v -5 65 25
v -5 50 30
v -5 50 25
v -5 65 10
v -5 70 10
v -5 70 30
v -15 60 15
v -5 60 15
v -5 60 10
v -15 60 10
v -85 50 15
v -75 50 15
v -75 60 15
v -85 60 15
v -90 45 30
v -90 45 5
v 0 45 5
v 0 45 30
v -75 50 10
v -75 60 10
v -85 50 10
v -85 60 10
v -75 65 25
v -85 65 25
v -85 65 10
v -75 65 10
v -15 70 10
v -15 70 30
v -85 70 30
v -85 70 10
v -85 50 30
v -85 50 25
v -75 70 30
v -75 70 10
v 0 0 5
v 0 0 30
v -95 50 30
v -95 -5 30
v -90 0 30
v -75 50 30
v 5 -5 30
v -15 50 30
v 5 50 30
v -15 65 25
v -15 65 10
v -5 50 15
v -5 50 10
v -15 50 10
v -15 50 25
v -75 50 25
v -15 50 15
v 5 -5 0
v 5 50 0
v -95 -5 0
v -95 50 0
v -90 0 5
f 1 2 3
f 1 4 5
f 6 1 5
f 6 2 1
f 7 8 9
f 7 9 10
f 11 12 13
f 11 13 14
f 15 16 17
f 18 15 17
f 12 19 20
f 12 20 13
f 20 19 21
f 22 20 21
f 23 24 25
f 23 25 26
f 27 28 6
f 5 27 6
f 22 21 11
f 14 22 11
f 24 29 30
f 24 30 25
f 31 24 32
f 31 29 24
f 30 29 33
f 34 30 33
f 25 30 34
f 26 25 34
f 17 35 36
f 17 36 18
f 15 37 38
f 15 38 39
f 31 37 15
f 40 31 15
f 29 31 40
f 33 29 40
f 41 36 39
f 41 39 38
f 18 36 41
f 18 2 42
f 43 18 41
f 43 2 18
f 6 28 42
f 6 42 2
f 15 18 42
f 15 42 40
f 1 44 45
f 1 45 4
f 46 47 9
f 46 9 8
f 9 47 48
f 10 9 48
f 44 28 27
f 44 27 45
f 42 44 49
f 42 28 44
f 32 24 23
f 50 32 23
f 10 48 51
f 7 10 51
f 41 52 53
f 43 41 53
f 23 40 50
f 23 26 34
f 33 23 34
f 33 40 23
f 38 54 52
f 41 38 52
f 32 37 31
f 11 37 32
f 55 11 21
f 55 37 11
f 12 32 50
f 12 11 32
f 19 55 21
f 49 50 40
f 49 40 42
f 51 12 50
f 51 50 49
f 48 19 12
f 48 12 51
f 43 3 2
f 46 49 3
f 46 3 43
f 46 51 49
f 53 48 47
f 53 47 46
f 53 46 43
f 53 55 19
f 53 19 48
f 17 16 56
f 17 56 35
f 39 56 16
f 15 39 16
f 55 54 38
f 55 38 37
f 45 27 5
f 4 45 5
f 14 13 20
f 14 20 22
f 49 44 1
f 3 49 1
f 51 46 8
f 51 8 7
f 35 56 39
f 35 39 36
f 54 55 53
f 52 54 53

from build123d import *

# Parameters (mm, degrees)
F0_W     = 90
F0_H     = 45
F1_DEPTH = 5
F0_W_2   = 99.999998
F0_H_2   = 54.999998
F2_DEPTH = 30
F3_W     = 10
F3_H     = 15
F3_H_2   = 5
F4_DEPTH = 5
F5_DEPTH = 20
F6_W     = 10
F6_H     = 5
F7_DEPTH = 10


with BuildPart() as f1:
    # F0 (on Top) → F1 (new body)
    with BuildSketch(Plane.XY):
        with Locations((-45, 22.5)):
            Rectangle(F0_W, F0_H)
    extrude(amount=F1_DEPTH)

    # F0 (on Top) → F2 (join)
    with BuildSketch(Plane.XY):
        with Locations((-45, 22.5)):
            Rectangle(F0_W_2, F0_H_2)
        with Locations((-45, 22.5)):
            Rectangle(F0_W, F0_H, mode=Mode.SUBTRACT)
    extrude(amount=F2_DEPTH)

    # F3 (on face) → F4 (join)
    with BuildSketch(Plane.XY.offset(30)):
        with Locations((-79.999999, 57.499999)):
            Rectangle(F3_W, F3_H)
        with Locations((-79.999999, 67.499999)):
            Rectangle(F3_W, F3_H_2)
        with Locations((-10.000001, 57.499999)):
            Rectangle(F3_W, F3_H)
        with Locations((-10.000001, 67.499999)):
            Rectangle(F3_W, F3_H_2)
    extrude(amount=-F4_DEPTH)

    # F3 (on face) → F5 (join)
    with BuildSketch(Plane.XY.offset(30)):
        with Locations((-79.999999, 67.499999)):
            Rectangle(F3_W, F3_H_2)
        with Locations((-10.000001, 67.499999)):
            Rectangle(F3_W, F3_H_2)
    extrude(amount=-F5_DEPTH)

    # F6 (on face) → F7 (join)
    with BuildSketch(Plane(origin=(0, 49.999999, 0), x_dir=(-1, 0, 0), z_dir=(0, 1, 0))):
        with Locations((10.000001, 12.5)):
            Rectangle(F6_W, F6_H)
        with Locations((79.999999, 12.5)):
            Rectangle(F6_W, F6_H)
    extrude(amount=F7_DEPTH)


solid = f1.part
